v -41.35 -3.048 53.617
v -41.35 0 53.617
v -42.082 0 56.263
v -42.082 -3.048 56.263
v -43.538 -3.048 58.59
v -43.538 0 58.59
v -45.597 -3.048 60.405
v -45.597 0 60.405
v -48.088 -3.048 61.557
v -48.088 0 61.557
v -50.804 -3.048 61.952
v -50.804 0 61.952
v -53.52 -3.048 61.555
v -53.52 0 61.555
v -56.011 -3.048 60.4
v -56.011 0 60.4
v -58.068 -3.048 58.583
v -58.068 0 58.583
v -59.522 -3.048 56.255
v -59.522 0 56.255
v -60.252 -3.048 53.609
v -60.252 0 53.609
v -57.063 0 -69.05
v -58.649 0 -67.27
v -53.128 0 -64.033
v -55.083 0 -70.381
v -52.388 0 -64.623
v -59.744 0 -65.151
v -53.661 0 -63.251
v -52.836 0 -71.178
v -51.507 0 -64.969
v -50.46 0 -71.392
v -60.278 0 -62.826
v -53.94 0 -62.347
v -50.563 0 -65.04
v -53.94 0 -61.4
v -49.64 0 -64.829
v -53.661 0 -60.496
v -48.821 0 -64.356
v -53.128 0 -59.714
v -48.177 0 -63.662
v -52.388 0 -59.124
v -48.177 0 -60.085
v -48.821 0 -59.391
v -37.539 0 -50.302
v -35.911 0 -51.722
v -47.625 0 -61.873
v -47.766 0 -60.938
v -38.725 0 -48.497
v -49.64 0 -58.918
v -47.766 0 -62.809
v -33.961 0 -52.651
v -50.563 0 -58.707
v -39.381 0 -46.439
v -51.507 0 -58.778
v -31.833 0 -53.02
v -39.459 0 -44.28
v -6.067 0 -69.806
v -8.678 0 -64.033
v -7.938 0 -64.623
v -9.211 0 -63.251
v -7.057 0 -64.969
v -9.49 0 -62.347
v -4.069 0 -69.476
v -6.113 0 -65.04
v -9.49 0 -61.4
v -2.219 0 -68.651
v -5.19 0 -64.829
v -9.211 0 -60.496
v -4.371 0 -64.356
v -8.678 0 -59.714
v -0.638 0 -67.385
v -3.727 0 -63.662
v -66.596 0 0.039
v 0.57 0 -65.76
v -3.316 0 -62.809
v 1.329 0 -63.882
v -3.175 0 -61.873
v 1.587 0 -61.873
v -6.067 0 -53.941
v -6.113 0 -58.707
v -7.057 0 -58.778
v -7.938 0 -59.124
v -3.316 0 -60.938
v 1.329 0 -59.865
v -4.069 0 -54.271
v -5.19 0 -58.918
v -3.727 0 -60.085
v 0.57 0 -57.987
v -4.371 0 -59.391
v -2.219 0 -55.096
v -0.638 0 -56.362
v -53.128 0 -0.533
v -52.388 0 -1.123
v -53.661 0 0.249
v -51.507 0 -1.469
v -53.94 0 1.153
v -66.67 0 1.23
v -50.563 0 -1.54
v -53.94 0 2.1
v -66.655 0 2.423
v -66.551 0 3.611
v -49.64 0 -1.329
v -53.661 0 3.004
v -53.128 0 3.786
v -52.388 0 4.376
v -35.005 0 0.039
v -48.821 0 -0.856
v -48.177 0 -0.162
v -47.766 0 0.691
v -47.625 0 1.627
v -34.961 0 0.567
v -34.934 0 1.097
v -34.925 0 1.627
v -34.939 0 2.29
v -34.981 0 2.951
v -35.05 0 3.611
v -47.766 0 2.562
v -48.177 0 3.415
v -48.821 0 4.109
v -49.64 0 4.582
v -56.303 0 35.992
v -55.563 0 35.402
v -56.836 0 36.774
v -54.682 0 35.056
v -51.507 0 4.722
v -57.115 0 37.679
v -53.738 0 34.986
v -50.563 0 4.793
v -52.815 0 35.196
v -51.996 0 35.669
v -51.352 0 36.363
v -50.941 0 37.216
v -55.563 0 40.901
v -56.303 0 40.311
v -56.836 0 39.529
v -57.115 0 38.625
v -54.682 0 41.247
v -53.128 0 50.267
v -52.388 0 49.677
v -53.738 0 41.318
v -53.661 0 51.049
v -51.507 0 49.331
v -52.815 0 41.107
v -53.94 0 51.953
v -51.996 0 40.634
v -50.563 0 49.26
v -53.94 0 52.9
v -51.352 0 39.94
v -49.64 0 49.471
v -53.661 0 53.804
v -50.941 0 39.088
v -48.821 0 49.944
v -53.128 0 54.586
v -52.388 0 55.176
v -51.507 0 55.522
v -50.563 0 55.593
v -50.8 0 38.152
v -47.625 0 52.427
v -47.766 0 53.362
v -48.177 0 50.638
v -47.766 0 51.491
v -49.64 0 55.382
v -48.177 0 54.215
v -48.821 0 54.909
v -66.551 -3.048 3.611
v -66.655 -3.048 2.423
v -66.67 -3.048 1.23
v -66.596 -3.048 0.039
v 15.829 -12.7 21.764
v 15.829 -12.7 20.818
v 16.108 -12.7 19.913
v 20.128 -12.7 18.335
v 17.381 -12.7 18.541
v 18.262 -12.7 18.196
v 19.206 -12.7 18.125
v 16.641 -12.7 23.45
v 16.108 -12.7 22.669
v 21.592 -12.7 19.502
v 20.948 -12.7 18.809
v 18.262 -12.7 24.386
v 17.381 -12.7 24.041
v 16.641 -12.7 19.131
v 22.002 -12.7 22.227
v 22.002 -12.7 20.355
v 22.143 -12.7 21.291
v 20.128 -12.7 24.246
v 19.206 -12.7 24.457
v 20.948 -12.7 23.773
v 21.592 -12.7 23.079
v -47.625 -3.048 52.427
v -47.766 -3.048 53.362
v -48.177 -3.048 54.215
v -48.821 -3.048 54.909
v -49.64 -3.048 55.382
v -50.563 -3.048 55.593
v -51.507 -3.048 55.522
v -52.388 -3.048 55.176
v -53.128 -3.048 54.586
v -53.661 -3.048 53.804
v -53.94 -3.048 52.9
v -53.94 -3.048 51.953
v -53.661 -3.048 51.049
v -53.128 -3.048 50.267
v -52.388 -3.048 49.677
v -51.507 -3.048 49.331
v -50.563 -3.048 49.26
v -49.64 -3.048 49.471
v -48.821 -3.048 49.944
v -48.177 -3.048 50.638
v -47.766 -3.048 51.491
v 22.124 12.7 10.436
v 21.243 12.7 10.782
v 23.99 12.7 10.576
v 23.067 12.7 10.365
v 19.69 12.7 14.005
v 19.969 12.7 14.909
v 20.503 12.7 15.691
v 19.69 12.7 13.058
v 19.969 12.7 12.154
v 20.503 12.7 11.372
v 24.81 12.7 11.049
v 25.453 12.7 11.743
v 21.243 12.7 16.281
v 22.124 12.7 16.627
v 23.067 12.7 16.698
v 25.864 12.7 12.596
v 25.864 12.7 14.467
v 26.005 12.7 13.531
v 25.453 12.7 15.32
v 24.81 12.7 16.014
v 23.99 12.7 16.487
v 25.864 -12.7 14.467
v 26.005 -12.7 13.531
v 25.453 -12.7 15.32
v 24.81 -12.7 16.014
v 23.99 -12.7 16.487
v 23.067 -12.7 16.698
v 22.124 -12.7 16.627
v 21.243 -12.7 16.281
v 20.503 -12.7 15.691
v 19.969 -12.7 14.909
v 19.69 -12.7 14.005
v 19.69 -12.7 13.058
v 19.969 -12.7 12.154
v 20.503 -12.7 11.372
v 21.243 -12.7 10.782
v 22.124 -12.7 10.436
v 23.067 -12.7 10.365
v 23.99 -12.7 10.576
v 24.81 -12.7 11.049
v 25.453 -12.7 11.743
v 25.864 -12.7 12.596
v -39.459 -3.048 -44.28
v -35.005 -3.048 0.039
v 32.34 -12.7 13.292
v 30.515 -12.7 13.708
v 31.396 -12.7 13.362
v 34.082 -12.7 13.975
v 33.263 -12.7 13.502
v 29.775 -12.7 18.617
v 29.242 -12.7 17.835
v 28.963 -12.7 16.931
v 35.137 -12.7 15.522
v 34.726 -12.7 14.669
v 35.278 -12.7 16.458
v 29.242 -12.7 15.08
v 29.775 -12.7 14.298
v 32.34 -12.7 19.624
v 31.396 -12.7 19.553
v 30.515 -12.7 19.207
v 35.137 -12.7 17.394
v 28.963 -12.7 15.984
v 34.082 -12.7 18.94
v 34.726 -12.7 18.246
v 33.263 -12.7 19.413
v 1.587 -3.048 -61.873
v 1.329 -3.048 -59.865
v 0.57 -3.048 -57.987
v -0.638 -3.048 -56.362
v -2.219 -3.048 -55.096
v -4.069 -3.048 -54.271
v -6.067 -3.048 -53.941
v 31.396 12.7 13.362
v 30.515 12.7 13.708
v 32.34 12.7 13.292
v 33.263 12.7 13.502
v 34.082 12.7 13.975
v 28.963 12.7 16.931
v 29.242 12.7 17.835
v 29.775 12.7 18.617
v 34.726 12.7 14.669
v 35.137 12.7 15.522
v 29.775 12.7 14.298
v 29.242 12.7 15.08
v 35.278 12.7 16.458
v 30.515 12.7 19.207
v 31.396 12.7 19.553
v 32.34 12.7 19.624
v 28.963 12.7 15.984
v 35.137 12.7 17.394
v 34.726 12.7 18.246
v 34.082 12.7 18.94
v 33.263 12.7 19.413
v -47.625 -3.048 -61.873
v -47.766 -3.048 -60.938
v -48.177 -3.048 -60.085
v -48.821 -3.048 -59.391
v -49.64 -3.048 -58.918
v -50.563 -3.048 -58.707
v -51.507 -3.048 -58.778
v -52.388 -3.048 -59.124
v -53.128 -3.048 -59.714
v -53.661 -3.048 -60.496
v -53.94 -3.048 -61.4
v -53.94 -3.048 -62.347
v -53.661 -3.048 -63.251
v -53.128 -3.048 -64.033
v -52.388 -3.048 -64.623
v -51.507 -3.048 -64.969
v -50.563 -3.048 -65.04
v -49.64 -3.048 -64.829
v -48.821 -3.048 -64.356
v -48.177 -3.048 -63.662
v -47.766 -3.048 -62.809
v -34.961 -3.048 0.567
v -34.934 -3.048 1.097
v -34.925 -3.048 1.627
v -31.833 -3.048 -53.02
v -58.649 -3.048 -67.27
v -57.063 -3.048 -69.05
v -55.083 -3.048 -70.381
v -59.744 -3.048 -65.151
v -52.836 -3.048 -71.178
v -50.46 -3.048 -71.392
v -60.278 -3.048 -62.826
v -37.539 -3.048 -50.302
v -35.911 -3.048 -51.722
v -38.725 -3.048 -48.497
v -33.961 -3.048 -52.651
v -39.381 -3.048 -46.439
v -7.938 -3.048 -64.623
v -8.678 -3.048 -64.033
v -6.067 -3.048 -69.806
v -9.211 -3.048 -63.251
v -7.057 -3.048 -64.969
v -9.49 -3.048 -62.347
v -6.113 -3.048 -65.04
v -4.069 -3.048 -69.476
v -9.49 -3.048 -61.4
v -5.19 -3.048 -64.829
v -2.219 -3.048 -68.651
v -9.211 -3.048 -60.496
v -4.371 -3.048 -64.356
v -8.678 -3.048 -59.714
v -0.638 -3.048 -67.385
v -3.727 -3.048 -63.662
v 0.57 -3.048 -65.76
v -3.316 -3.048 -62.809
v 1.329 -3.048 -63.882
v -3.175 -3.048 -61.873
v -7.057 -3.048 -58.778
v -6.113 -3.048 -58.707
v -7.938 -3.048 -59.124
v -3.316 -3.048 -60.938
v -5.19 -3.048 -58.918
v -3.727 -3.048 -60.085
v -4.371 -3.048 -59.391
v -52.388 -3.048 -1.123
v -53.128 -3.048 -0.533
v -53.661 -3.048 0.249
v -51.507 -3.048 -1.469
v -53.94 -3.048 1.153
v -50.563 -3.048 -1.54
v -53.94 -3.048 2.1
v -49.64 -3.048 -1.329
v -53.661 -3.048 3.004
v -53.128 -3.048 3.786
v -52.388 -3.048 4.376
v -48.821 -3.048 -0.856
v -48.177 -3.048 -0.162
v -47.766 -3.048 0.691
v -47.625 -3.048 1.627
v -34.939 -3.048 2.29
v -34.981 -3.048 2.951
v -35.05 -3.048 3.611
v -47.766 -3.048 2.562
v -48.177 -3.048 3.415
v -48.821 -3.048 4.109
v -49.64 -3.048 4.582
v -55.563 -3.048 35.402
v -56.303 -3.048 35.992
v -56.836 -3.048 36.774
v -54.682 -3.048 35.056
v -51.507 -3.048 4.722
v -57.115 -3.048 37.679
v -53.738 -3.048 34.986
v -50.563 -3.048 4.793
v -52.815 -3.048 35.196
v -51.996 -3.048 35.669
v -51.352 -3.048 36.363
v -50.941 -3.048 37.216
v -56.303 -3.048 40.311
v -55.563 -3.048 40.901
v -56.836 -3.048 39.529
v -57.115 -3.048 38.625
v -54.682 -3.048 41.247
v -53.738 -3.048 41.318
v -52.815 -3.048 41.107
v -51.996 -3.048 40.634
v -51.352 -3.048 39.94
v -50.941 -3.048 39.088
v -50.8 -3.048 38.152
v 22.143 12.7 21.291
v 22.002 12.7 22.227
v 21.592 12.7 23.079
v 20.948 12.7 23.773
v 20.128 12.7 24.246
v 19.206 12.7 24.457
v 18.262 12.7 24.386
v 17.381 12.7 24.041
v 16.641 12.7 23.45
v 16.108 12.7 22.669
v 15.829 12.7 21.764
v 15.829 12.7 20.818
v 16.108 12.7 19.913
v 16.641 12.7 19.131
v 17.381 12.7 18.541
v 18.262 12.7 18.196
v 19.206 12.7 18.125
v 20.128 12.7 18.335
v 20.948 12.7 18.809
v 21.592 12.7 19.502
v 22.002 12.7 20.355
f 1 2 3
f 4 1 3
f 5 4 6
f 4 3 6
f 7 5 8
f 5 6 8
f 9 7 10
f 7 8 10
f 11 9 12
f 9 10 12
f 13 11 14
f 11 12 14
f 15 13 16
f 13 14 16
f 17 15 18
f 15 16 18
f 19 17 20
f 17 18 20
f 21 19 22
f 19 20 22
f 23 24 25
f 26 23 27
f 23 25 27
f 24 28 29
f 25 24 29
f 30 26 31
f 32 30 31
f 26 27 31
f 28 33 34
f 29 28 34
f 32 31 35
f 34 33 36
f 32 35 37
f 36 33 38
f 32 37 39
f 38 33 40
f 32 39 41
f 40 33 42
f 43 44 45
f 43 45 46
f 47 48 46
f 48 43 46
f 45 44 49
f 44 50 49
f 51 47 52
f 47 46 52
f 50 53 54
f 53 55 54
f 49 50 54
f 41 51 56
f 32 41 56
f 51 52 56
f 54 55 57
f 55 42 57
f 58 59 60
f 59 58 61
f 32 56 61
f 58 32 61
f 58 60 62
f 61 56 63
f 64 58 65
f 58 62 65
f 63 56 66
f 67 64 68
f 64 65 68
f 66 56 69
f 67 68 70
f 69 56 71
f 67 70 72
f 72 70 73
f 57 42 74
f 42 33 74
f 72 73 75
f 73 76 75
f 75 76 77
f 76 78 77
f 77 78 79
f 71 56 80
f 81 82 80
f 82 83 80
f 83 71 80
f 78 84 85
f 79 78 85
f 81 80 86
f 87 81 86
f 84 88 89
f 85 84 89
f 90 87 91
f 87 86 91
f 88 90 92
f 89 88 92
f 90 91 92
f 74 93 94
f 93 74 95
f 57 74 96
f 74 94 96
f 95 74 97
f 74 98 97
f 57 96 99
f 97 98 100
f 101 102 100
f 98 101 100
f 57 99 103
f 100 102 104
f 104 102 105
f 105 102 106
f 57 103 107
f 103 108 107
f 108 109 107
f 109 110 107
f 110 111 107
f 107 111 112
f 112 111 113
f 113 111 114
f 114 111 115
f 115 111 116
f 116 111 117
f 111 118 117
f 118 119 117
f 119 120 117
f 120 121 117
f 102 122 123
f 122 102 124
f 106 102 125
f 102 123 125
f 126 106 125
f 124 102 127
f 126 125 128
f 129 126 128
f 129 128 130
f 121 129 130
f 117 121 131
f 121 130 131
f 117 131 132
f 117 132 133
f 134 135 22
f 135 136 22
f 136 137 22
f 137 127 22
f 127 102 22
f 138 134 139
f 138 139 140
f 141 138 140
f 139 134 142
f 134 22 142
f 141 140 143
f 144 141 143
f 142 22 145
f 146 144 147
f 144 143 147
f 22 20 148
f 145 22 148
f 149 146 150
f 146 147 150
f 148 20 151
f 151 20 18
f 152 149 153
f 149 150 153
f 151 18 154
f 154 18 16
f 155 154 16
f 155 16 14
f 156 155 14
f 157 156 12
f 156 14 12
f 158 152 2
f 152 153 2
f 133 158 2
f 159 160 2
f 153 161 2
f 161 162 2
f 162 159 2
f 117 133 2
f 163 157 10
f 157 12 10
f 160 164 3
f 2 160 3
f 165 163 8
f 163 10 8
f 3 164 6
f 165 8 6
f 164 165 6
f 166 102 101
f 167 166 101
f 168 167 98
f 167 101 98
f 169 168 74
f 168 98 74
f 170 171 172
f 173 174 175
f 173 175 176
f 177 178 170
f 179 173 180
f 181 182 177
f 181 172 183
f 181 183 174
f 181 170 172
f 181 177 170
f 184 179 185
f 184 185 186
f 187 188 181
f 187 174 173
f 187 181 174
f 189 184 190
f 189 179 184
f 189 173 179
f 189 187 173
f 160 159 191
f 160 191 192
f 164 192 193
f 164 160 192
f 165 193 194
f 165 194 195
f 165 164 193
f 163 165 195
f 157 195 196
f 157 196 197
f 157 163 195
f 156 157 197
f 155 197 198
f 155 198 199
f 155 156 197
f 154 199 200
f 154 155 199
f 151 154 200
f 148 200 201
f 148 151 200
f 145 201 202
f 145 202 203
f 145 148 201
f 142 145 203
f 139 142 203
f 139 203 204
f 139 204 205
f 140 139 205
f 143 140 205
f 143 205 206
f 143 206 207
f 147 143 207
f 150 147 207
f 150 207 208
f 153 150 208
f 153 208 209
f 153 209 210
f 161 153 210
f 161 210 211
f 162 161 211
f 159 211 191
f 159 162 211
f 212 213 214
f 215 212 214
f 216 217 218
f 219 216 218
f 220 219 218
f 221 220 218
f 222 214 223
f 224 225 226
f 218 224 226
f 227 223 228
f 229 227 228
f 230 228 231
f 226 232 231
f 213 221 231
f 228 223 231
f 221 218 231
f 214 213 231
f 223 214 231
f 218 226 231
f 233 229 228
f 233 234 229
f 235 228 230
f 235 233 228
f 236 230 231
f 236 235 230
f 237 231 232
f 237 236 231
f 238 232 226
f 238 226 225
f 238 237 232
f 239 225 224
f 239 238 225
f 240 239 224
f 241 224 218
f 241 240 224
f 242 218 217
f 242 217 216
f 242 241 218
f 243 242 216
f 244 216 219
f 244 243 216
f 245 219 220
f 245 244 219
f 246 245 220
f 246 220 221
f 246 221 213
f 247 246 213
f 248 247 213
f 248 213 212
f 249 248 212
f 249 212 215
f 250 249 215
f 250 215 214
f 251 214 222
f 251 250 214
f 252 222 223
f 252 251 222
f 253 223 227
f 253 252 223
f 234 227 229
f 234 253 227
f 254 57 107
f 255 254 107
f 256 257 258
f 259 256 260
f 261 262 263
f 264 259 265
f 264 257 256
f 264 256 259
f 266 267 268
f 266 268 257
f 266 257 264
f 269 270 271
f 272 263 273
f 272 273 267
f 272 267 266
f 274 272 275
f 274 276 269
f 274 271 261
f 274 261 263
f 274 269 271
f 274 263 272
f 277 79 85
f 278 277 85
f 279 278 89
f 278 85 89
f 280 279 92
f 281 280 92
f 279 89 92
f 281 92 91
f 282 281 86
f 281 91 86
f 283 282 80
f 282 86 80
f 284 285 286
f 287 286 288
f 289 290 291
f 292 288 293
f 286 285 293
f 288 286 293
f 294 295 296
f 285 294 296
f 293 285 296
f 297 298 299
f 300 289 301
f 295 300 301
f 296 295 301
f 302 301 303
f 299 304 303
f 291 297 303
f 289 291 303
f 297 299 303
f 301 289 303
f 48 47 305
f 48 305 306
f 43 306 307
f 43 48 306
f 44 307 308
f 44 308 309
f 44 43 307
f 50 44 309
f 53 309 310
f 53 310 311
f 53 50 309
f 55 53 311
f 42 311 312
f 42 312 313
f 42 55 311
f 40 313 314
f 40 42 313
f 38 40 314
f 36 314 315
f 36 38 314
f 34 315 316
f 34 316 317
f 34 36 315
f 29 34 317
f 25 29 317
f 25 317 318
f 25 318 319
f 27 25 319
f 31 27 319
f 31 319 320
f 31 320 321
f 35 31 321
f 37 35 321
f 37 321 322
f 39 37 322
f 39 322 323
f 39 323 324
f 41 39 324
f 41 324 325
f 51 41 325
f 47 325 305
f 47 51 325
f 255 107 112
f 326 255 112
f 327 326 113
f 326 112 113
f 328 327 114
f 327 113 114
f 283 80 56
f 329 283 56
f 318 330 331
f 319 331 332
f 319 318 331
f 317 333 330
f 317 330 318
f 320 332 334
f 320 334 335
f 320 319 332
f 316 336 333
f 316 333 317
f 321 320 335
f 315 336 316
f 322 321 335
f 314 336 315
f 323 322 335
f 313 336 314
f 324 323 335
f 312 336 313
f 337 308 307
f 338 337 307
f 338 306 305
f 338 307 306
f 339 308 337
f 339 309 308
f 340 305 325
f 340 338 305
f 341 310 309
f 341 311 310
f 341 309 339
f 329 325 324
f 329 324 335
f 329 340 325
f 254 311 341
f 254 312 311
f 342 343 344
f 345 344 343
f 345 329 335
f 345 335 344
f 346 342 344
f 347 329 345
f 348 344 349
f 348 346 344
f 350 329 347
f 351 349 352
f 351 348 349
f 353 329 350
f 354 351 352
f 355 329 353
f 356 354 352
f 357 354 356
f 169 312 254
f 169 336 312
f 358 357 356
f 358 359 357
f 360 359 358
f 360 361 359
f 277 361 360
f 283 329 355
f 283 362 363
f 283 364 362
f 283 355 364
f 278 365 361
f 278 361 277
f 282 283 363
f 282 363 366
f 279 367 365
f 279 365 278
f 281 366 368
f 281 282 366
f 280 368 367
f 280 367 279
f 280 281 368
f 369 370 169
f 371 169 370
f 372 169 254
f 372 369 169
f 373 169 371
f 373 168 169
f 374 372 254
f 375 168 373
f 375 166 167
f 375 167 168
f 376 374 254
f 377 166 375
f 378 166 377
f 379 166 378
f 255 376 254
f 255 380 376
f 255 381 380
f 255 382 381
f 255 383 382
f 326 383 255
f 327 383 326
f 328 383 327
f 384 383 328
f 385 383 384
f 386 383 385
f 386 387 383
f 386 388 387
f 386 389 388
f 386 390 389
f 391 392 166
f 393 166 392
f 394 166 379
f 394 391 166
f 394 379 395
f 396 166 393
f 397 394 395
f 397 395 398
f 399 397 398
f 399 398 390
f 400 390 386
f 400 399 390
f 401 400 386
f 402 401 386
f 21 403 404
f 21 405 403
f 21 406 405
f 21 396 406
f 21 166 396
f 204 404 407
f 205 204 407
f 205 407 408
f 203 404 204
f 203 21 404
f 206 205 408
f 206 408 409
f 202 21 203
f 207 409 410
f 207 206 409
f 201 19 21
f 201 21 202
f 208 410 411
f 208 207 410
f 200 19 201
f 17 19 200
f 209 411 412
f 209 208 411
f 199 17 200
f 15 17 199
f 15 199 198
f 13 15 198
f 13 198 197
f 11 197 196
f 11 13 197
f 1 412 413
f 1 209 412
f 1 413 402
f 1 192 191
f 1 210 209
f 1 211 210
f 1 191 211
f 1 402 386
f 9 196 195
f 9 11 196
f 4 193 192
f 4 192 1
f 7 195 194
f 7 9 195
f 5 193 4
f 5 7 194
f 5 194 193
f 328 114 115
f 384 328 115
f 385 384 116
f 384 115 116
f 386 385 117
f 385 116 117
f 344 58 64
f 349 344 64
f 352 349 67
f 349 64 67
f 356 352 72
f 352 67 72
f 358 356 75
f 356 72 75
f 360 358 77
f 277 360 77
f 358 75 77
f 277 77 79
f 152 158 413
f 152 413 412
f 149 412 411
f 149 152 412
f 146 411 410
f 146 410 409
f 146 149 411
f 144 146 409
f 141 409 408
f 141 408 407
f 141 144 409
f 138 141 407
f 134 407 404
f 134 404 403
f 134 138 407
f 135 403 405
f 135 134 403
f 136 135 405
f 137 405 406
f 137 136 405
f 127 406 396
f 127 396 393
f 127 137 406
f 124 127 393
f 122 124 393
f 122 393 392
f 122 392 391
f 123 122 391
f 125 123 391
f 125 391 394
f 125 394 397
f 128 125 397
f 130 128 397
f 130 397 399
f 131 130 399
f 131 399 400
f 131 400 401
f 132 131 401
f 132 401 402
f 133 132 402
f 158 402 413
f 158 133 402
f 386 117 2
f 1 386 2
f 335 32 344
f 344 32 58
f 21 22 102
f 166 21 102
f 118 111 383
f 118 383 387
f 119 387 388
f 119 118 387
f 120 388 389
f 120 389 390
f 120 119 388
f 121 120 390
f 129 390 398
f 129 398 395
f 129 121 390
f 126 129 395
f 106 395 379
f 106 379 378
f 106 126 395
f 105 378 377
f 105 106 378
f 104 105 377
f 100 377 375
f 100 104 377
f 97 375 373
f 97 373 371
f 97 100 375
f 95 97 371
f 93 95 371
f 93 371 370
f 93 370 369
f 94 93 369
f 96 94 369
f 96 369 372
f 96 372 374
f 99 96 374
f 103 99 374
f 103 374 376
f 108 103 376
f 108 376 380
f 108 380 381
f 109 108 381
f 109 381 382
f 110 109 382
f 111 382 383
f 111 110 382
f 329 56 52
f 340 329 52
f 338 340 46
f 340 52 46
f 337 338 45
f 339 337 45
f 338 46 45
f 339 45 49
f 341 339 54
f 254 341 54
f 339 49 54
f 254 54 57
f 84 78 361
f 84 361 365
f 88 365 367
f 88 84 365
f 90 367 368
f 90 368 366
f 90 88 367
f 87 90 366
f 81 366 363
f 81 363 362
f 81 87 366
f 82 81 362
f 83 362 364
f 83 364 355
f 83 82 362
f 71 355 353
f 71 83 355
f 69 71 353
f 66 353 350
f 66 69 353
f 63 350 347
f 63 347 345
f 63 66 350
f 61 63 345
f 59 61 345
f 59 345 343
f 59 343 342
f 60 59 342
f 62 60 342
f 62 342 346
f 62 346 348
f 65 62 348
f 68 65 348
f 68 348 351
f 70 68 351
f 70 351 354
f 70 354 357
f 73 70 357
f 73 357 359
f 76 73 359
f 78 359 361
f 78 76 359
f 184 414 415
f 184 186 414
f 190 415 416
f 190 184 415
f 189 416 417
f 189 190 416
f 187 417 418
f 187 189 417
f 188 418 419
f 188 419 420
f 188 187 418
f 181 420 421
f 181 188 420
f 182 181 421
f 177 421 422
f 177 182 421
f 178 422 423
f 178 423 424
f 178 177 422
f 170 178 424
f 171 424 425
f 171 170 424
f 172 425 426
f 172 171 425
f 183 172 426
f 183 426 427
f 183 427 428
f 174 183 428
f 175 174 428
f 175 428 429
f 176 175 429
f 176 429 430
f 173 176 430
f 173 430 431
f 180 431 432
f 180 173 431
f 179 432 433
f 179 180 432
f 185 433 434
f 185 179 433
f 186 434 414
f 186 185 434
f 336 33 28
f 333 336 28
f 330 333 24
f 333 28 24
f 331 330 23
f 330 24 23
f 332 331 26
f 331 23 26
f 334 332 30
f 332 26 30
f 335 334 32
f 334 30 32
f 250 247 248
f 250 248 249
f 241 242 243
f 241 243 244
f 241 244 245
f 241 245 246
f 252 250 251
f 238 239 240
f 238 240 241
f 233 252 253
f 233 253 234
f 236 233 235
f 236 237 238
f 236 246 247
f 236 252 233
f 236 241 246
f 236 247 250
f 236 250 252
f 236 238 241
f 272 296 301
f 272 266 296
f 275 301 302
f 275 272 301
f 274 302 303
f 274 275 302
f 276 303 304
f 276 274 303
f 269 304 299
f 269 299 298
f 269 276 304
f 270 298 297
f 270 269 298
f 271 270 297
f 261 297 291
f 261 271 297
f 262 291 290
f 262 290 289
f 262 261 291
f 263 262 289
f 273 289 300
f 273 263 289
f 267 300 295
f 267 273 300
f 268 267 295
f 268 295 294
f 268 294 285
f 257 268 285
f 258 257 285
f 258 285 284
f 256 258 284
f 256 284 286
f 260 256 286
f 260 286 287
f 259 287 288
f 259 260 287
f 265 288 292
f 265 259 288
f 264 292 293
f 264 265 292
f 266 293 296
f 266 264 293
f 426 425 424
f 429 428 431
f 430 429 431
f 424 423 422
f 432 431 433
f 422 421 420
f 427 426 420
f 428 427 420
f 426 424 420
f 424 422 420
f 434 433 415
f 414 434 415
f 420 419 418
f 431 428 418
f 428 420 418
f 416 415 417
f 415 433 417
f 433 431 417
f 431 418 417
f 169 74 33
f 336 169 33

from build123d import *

# Parameters (mm, degrees)
F0_R     = 3.175
F1_DEPTH = 3.048
F2_R     = 3.175
F3_DEPTH = 12.7
F5_R     = 3.175
F6_DEPTH = 12.7
F4_R     = 3.175
F7_DEPTH = 12.7


# Not quite as in the source:
# - ends of sketch curves that miss each other by under 0.0002 mm in the source are joined


with BuildPart() as f1:
    # F0 (on Front) → F1 (new body)
    with BuildSketch(Plane.XZ):
        with BuildLine():
            ThreePointArc((-60.2516630306, 53.6090369056), (-51.3927330128, 42.919997736), (-41.2753472159, 52.4265588422))
            ThreePointArc((-41.2753472159, 52.4265588422), (-41.2940423216, 53.0230420842), (-41.3500542517, 53.6171838422))
            ThreePointArc((-41.3500542517, 53.6171838422), (-50.8044526635, 61.9515579575), (-60.2516630306, 53.6090369056))
        make_face()
        with Locations((-50.8003472159, 52.4265588422)):
            Circle(F0_R, mode=Mode.SUBTRACT)
        with BuildLine():
            ThreePointArc((-41.3500542517, 53.6171838422), (-41.2940423216, 53.0230420842), (-41.2753472159, 52.4265588422))
            ThreePointArc((-41.2753472159, 52.4265588422), (-51.3927330128, 42.919997736), (-60.2516630306, 53.6090369056))
            Line((-60.2516630306, 53.6090369056), (-66.5508354393, 3.6109342409))
            ThreePointArc((-66.5508354393, 3.6109342409), (-50.800347015, 17.5015588422), (-35.0498589422, 3.6109338422))
            Line((-35.0498589422, 3.6109338422), (-41.3500542517, 53.6171838422))
        make_face()
        with Locations((-53.9753472159, 38.1517588422)):
            Circle(F0_R, mode=Mode.SUBTRACT)
        with BuildLine():
            ThreePointArc((-34.9253472159, 1.6265588422), (-34.9565057255, 2.6206975789), (-35.0498589422, 3.6109338422))
            ThreePointArc((-35.0498589422, 3.6109338422), (-50.800347015, 17.5015588422), (-66.5508354393, 3.6109342409))
            ThreePointArc((-66.5508354393, 3.6109342409), (-66.6740910318, 1.8262642914), (-66.5957727323, 0.0390583677))
            ThreePointArc((-66.5957727323, 0.0390583677), (-50.8003466117, -14.2484411578), (-35.0049215787, 0.03905957))
            ThreePointArc((-35.0049215787, 0.03905957), (-34.9452532869, 0.8318126534), (-34.9253472159, 1.6265588422))
        make_face()
        with Locations((-50.8003472159, 1.6265588422)):
            Circle(F0_R, mode=Mode.SUBTRACT)
        with BuildLine():
            ThreePointArc((-35.0049215787, 0.03905957), (-50.8003466117, -14.2484411578), (-66.5957727323, 0.0390583677))
            Line((-66.5957727323, 0.0390583677), (-60.2776025543, -62.8259411578))
            ThreePointArc((-60.2776025543, -62.8259411578), (-51.2771951483, -52.3603848114), (-41.2753472159, -61.8734411578))
            ThreePointArc((-41.2753472159, -61.8734411578), (-43.9459387338, -68.4872682919), (-50.460168079, -71.3923645819))
            Line((-50.460168079, -71.3923645819), (-6.066865073, -69.8058773614))
            ThreePointArc((-6.066865073, -69.8058773614), (-14.2878472159, -61.8734411578), (-6.066865073, -53.9410049541))
            Line((-6.066865073, -53.9410049541), (-31.8327472154, -53.0202074469))
            ThreePointArc((-31.8327472154, -53.0202074469), (-37.5391473185, -50.3020820079), (-39.4591606236, -44.2800593454))
            Line((-39.4591606236, -44.2800593454), (-35.0049215787, 0.03905957))
        make_face()
        with BuildLine():
            ThreePointArc((-41.2753472159, -61.8734411578), (-51.2771951483, -52.3603848114), (-60.2776025543, -62.8259411578))
            ThreePointArc((-60.2776025543, -62.8259411578), (-57.0627303844, -69.0503612528), (-50.460168079, -71.3923645819))
            ThreePointArc((-50.460168079, -71.3923645819), (-43.9459387338, -68.4872682919), (-41.2753472159, -61.8734411578))
        make_face()
        with Locations((-50.8003472159, -61.8734411578)):
            Circle(F0_R, mode=Mode.SUBTRACT)
        with BuildLine():
            ThreePointArc((-6.066865073, -53.9410049541), (-14.2878472159, -61.8734411578), (-6.066865073, -69.8058773614))
            ThreePointArc((-6.066865073, -69.8058773614), (-0.6383403112, -67.3849639392), (1.5871527841, -61.8734411578))
            ThreePointArc((1.5871527841, -61.8734411578), (-0.6383403112, -56.3619183763), (-6.066865073, -53.9410049541))
        make_face()
        with Locations((-6.3503472159, -61.8734411578)):
            Circle(F0_R, mode=Mode.SUBTRACT)
    extrude(amount=F1_DEPTH)


with BuildPart() as f3:
    # F2 (on Front) → F3 (new body, symmetric)
    with BuildSketch(Plane.XZ):
        with Locations((18.9683057667, 21.2909408399)):
            Circle(F2_R)
    extrude(amount=F3_DEPTH, both=True)


with BuildPart() as f6:
    # F5 (on Front) → F6 (new body, symmetric)
    with BuildSketch(Plane.XZ):
        with Locations((32.1025885642, 16.4576992393)):
            Circle(F5_R)
    extrude(amount=F6_DEPTH, both=True)


with BuildPart() as f7:
    # F4 (on Front) → F7 (new body, symmetric)
    with BuildSketch(Plane.XZ):
        with Locations((22.8300068826, 13.5314479956)):
            Circle(F4_R)
    extrude(amount=F7_DEPTH, both=True)


solid = Compound([f1.part, f3.part, f6.part, f7.part])
